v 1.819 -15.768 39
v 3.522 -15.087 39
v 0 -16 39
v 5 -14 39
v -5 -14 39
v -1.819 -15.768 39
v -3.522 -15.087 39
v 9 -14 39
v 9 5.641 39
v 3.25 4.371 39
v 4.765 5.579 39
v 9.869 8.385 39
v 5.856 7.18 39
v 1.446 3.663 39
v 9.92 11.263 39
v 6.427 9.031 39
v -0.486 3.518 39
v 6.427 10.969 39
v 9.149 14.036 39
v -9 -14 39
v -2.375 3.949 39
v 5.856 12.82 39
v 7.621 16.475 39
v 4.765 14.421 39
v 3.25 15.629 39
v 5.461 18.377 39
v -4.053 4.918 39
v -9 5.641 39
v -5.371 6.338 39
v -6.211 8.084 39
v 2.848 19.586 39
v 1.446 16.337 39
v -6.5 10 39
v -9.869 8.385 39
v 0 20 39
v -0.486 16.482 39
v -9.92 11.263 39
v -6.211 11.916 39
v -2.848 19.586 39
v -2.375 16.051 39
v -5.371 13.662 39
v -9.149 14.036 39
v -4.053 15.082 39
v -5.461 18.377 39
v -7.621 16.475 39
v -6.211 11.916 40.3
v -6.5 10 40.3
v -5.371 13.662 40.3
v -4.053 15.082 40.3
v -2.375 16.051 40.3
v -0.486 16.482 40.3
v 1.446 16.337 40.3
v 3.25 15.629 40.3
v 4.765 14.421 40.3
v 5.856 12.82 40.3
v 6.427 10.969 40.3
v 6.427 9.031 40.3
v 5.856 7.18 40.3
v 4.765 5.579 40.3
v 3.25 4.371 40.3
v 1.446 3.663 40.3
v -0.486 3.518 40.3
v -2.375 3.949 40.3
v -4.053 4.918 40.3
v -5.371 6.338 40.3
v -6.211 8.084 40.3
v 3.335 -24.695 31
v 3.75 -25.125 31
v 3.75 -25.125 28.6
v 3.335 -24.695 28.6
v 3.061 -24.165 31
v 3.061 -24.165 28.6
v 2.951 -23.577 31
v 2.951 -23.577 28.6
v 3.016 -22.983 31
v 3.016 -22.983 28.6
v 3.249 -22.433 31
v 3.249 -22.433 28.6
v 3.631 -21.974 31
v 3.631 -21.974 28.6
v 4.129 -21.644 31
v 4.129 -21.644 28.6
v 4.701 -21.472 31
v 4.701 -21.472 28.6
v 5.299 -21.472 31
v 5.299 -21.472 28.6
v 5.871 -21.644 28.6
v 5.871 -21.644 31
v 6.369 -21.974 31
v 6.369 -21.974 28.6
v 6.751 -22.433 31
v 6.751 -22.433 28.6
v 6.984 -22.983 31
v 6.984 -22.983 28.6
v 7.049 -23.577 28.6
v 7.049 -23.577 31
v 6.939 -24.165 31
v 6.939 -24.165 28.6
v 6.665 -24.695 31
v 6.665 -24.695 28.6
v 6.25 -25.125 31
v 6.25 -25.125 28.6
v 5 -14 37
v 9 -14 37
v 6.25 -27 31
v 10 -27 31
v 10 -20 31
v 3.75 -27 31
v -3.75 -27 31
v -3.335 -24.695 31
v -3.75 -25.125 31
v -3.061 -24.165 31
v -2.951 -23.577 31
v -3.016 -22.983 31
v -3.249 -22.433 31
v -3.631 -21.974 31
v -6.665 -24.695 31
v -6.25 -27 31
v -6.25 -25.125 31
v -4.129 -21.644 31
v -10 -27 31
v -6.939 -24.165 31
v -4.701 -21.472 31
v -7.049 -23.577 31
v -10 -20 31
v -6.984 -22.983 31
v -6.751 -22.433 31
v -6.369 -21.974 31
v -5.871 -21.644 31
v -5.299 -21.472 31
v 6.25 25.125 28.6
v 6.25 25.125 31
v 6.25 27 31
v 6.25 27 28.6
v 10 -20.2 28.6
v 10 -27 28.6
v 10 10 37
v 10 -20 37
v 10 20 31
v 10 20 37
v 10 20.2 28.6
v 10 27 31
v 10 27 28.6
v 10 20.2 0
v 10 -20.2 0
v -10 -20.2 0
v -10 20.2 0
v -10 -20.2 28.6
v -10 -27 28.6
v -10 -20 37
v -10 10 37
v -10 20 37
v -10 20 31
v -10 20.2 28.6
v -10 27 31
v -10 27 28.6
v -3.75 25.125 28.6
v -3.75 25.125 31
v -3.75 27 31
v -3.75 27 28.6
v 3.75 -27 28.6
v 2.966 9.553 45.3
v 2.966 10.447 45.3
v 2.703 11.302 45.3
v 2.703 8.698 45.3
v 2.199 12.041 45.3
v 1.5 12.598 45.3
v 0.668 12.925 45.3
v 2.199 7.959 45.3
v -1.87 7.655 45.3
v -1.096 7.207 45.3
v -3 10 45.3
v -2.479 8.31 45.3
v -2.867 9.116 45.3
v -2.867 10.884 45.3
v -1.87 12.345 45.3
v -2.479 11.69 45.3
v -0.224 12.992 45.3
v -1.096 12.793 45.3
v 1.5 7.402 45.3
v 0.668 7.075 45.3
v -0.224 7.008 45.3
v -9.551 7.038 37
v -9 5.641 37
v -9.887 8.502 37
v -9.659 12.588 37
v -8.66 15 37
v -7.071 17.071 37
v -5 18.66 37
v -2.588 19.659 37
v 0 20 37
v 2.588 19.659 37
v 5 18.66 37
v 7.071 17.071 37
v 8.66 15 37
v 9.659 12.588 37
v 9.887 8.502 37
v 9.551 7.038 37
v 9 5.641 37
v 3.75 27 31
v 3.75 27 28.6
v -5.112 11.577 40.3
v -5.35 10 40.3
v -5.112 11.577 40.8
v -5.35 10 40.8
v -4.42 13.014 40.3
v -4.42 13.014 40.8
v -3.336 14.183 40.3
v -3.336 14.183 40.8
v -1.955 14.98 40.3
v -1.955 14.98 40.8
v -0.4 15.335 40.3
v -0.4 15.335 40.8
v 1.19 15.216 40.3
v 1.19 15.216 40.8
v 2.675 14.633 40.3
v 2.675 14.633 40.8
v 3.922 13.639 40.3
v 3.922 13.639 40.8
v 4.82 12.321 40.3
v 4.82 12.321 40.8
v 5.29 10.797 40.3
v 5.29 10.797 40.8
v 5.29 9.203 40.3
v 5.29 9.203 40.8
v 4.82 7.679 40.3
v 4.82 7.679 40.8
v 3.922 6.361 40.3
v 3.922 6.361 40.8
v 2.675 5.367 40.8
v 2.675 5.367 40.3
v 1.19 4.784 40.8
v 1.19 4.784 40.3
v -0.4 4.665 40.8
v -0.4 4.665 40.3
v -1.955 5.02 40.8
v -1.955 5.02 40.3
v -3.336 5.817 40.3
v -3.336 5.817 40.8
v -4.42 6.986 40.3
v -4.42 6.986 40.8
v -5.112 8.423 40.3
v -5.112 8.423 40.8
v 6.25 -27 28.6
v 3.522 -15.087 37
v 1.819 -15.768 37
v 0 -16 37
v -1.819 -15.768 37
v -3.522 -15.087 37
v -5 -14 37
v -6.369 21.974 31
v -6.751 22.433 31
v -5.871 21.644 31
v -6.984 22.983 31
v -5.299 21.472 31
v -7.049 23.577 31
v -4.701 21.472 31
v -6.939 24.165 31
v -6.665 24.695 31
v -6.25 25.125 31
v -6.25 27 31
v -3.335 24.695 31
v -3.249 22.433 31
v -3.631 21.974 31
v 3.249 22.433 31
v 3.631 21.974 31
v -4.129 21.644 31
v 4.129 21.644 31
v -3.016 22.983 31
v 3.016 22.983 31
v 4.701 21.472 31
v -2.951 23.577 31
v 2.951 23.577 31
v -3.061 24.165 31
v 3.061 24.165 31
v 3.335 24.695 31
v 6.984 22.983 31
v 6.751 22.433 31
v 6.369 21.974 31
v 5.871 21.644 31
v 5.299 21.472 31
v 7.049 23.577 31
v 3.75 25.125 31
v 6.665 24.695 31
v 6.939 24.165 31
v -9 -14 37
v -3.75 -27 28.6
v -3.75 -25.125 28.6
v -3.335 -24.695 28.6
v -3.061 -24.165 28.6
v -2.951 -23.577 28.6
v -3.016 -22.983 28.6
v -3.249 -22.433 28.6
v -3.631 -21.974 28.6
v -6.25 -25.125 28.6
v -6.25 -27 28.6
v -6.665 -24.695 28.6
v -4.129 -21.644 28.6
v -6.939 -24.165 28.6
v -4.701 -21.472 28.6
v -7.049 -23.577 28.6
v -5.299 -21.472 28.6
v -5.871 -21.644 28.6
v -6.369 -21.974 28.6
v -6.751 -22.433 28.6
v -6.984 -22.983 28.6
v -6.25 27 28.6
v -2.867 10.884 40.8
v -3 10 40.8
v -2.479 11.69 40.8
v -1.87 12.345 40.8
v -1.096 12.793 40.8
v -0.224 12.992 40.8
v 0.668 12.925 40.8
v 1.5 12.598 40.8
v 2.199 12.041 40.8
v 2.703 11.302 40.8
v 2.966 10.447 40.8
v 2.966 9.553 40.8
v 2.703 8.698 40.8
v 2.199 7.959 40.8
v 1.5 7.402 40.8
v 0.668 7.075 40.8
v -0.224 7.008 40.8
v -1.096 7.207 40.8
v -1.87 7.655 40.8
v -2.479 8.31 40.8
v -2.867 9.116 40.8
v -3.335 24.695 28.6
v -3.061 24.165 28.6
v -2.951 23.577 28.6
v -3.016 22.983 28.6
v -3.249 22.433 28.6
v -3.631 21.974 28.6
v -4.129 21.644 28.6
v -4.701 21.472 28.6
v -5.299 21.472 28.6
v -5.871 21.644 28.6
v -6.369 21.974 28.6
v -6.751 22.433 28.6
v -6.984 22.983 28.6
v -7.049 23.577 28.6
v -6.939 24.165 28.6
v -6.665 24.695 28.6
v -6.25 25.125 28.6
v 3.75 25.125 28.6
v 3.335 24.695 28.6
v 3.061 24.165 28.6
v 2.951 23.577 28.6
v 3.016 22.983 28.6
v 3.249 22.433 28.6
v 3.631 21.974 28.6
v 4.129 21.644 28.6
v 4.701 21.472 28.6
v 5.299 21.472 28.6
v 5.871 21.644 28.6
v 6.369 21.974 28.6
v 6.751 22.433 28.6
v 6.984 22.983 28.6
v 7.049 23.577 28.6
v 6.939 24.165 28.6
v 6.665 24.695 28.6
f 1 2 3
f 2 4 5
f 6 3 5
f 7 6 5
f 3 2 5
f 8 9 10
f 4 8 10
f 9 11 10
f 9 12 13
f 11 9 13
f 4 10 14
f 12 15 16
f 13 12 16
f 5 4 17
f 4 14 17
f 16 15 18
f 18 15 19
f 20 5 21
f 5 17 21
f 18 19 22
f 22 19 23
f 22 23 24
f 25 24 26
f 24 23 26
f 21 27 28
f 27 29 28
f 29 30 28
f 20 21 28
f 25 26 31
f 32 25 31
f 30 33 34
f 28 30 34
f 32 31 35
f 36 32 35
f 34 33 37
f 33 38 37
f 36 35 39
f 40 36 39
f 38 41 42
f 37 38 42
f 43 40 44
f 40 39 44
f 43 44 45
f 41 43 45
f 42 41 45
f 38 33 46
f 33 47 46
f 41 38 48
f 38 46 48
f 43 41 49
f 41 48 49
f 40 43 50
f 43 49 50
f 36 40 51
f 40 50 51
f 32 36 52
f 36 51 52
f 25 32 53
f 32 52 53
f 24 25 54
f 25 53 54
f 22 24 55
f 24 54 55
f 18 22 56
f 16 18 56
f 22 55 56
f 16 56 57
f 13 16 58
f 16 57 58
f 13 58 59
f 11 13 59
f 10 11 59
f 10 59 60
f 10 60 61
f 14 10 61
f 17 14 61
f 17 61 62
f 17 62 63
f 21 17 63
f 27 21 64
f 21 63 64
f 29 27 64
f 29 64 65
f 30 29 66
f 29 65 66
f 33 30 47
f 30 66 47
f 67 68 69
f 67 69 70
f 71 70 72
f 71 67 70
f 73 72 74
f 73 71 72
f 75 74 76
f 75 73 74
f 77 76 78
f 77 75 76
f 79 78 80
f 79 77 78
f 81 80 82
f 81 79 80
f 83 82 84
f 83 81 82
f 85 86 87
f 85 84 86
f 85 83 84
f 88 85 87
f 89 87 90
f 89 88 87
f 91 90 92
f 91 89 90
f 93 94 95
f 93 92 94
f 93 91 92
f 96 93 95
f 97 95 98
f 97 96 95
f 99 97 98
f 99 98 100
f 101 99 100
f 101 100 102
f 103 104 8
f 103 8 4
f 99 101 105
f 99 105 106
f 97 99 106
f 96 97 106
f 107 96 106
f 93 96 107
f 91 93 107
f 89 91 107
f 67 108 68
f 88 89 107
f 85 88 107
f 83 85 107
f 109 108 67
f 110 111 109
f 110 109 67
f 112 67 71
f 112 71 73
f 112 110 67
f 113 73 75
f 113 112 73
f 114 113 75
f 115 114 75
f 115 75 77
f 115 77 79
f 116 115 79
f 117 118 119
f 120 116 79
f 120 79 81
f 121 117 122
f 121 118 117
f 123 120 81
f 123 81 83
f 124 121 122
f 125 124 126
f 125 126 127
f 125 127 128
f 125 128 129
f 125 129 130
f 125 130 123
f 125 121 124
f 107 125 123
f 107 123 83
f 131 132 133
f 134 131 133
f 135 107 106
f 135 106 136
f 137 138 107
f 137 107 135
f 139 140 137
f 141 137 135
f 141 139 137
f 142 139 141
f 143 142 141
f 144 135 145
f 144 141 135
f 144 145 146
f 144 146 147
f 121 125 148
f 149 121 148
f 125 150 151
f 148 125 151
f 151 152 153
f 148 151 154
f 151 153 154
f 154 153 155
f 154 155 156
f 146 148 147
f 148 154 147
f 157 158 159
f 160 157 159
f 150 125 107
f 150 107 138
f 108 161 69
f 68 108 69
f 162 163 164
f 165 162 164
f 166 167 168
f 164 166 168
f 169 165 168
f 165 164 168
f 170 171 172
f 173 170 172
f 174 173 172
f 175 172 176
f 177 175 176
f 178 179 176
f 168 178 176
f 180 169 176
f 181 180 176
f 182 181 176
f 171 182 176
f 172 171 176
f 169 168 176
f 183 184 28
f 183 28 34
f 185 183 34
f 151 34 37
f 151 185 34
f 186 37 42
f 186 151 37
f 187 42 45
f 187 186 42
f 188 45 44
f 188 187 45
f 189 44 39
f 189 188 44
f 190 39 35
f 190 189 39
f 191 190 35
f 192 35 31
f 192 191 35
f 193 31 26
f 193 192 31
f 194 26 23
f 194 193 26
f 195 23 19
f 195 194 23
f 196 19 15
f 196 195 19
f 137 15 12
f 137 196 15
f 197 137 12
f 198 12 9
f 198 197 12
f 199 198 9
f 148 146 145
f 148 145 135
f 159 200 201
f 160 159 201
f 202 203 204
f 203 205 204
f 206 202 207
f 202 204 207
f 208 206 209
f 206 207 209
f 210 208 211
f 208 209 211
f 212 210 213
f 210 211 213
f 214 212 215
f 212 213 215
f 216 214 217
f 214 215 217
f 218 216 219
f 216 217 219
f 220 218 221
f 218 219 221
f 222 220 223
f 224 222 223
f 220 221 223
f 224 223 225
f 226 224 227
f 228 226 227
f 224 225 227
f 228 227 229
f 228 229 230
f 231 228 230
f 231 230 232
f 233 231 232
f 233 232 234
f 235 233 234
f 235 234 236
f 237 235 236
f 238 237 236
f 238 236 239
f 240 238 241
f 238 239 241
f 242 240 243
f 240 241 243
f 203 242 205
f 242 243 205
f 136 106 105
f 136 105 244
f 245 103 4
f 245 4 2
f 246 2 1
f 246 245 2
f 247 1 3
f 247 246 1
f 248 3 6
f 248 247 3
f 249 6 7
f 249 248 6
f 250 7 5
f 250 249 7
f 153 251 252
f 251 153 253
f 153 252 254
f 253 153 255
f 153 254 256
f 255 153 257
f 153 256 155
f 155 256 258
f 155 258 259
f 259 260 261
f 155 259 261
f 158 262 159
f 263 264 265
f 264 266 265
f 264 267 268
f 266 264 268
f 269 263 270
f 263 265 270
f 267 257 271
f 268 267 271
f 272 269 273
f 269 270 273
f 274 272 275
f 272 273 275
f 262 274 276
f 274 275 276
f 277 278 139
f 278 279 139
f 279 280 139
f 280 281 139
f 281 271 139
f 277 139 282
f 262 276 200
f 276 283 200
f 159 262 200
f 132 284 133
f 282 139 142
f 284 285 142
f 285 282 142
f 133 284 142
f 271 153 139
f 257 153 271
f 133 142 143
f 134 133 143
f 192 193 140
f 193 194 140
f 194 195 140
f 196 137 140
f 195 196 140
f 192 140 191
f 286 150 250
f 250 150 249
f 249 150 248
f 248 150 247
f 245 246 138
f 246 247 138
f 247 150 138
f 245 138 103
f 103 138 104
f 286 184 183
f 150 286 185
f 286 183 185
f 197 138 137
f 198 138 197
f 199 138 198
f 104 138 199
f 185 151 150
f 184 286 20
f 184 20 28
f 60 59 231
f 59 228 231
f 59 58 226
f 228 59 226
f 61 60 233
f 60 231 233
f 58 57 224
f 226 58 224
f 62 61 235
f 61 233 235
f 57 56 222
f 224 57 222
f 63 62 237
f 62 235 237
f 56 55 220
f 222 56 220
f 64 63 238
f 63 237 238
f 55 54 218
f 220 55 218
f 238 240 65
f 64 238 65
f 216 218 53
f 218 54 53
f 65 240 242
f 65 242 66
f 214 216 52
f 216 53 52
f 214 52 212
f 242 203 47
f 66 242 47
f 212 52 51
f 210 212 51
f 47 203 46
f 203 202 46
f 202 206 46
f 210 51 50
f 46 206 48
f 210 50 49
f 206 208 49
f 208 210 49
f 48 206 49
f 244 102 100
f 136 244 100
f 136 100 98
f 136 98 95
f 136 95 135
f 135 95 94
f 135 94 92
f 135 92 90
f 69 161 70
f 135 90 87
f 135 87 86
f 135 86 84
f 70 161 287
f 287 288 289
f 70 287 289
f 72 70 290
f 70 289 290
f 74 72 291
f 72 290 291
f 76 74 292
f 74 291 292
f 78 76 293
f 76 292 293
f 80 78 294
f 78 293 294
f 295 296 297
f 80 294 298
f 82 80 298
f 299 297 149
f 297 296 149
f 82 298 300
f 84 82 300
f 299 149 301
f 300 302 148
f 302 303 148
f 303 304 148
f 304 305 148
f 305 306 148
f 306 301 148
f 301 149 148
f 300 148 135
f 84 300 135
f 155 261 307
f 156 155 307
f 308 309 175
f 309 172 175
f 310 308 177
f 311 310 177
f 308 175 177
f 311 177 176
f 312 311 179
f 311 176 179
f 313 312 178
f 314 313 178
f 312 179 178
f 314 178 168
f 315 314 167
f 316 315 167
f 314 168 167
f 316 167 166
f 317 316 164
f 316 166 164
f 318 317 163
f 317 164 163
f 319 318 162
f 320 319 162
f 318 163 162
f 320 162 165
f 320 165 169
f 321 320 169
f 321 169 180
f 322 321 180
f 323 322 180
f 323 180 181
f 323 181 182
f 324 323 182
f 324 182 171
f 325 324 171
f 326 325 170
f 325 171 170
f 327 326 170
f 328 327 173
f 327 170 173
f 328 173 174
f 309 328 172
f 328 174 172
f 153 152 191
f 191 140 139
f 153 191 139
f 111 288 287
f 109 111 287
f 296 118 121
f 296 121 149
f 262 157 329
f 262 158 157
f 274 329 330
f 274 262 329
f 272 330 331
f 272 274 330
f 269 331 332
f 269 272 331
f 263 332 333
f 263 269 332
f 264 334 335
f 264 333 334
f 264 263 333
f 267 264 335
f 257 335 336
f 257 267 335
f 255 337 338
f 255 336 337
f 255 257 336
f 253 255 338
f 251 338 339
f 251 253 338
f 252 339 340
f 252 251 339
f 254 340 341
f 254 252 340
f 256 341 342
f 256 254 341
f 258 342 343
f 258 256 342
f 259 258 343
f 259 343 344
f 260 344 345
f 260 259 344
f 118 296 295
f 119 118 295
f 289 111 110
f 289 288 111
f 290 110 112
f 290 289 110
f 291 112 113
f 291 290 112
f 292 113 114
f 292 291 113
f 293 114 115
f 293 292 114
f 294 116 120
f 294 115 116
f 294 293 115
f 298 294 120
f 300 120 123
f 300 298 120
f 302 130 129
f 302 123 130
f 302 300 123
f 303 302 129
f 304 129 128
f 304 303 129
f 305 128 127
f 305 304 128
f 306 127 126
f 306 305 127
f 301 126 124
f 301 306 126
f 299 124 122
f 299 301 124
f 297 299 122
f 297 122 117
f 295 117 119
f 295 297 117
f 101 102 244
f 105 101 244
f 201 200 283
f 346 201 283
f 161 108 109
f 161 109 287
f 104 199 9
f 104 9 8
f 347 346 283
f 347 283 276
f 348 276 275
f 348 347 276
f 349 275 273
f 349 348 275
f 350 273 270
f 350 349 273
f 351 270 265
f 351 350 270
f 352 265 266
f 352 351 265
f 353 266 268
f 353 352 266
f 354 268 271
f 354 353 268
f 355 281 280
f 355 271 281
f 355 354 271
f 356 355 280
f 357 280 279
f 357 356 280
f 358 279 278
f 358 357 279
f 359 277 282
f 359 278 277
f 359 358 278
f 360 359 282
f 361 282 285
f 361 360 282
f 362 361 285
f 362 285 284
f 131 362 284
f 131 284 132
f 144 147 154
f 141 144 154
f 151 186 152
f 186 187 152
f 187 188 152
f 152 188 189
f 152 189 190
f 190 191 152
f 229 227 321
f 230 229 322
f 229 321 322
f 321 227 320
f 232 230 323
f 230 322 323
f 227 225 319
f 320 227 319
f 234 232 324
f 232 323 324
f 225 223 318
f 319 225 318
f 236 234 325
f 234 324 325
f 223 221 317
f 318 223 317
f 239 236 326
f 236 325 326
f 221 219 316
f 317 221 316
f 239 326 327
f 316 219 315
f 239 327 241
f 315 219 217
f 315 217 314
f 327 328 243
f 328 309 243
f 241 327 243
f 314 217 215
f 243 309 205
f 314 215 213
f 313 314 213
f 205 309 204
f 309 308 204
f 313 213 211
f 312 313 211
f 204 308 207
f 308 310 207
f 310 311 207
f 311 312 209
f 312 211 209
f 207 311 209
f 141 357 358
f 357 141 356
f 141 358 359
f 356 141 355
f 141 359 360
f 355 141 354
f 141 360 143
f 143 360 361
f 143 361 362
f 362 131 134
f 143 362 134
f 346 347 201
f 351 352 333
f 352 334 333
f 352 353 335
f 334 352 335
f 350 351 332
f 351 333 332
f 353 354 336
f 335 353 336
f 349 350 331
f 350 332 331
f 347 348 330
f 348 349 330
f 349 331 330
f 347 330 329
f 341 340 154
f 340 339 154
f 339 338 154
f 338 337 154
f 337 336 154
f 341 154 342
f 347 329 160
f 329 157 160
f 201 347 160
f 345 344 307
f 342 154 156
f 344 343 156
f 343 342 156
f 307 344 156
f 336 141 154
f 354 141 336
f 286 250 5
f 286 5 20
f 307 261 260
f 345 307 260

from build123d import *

# Parameters (mm, degrees)
ESQUISSE1_W             = 37
ESQUISSE1_H             = 54
BOSS_EXTRU_1_DEPTH      = 20
BOSS_EXTRU_2_DEPTH      = 2
ESQUISSE3_W             = 6
ESQUISSE3_H             = 7
ENL_V_MAT_EXTRU_1_DEPTH = 52.478150705
ESQUISSE4_W             = 6
ESQUISSE4_H             = 7
ENL_V_MAT_EXTRU_2_DEPTH = 52.478150705
BOSS_EXTRU_3_DEPTH      = 2
ESQUISSE6_W             = 28.6
ESQUISSE6_H             = 6.8
ENL_V_MAT_EXTRU_3_DEPTH = 52.478150705
ENL_V_MAT_EXTRU_4_DEPTH = 41.582754958
ENL_V_MAT_EXTRU_5_DEPTH = 41.582754958
ESQUISSE9_W             = 28.6
ESQUISSE9_H             = 6.8
ENL_V_MAT_EXTRU_6_DEPTH = 52.478150705
ENL_V_MAT_EXTRU_7_DEPTH = 43.308391603
ENL_V_MAT_EXTRU_8_DEPTH = 43.308391603
ESQUISSE12_W            = 2.05
ESQUISSE12_H            = 2.4
ESQUISSE13_W            = 2.05
ESQUISSE13_H            = 2.4
ESQUISSE14_W            = 2.05
ESQUISSE14_H            = 2.4
ESQUISSE15_W            = 2.05
ESQUISSE15_H            = 2.4


with BuildPart() as part:
    # Esquisse1 → Boss.-Extru.1 (new body)
    with BuildSketch(Plane(origin=(10, 0, 0), x_dir=(0, 0, -1), z_dir=(1, 0, 0))):
        with Locations((-18.5, 0)):
            Rectangle(ESQUISSE1_W, ESQUISSE1_H)
    extrude(amount=-BOSS_EXTRU_1_DEPTH)

    # Esquisse2 → Boss.-Extru.2 (add)
    with BuildSketch(Plane.XY.offset(37)):
        with BuildLine():
            Line((-9, -14), (-9, 5.641101056))
            ThreePointArc((-9, 5.641101056), (0, 20), (9, 5.641101056))
            Line((9, 5.641101056), (9, -14))
            Line((9, -14), (-9, -14))
        make_face()
    extrude(amount=BOSS_EXTRU_2_DEPTH)

    # Esquisse3 → Enlèv. mat.-Extru.1 (cut, through all)
    with BuildSketch(Plane(origin=(10, 0, 0), x_dir=(0, 0, -1), z_dir=(1, 0, 0))):
        with Locations((-34, 23.5)):
            Rectangle(ESQUISSE3_W, ESQUISSE3_H)
    extrude(amount=-ENL_V_MAT_EXTRU_1_DEPTH, mode=Mode.SUBTRACT)

    # Esquisse4 → Enlèv. mat.-Extru.2 (cut, through all)
    with BuildSketch(Plane.ZY.offset(10)):
        with Locations((34, -23.5)):
            Rectangle(ESQUISSE4_W, ESQUISSE4_H)
    extrude(amount=-ENL_V_MAT_EXTRU_2_DEPTH, mode=Mode.SUBTRACT)

    # Esquisse5 → Boss.-Extru.3 (add)
    with BuildSketch(Plane.XY.offset(37)):
        with BuildLine():
            Line((-5, -14), (5, -14))
            ThreePointArc((5, -14), (0, -16), (-5, -14))
        make_face()
    extrude(amount=BOSS_EXTRU_3_DEPTH)

    # Esquisse6 → Enlèv. mat.-Extru.3 (cut, through all)
    with BuildSketch(Plane.ZY.offset(10)):
        with Locations((14.3, -23.6)):
            Rectangle(ESQUISSE6_W, ESQUISSE6_H)
    extrude(amount=-ENL_V_MAT_EXTRU_3_DEPTH, mode=Mode.SUBTRACT)

    # Esquisse7 → Enlèv. mat.-Extru.4 (cut, through all)
    with BuildSketch(Plane(origin=(0, 0, 28.6), x_dir=(-1, 0, 0), z_dir=(0, 0, -1))):
        with BuildLine():
            Line((3.75, -27), (6.25, -27))
            Line((6.25, -27), (6.25, -25.124807681))
            ThreePointArc((6.25, -25.124807681), (5, -25.55), (3.75, -25.124807681))
            Line((3.75, -25.124807681), (3.75, -27))
        make_face()
    extrude(amount=-ENL_V_MAT_EXTRU_4_DEPTH, mode=Mode.SUBTRACT)

    # Esquisse8 → Enlèv. mat.-Extru.5 (cut, through all)
    with BuildSketch(Plane(origin=(0, 0, 28.6), x_dir=(-1, 0, 0), z_dir=(0, 0, -1))):
        with BuildLine():
            Line((-6.25, -27), (-3.75, -27))
            Line((-3.75, -27), (-3.75, -25.124807681))
            ThreePointArc((-3.75, -25.124807681), (-5, -25.55), (-6.25, -25.124807681))
            Line((-6.25, -25.124807681), (-6.25, -27))
        make_face()
    extrude(amount=-ENL_V_MAT_EXTRU_5_DEPTH, mode=Mode.SUBTRACT)

    # Esquisse9 → Enlèv. mat.-Extru.6 (cut, through all)
    with BuildSketch(Plane.ZY.offset(10)):
        with Locations((14.3, 23.6)):
            Rectangle(ESQUISSE9_W, ESQUISSE9_H)
    extrude(amount=-ENL_V_MAT_EXTRU_6_DEPTH, mode=Mode.SUBTRACT)

    # Esquisse10 → Enlèv. mat.-Extru.7 (cut, through all)
    with BuildSketch(Plane.XY.offset(31)):
        with BuildLine():
            Line((-3.75, 27), (-6.25, 27))
            Line((-6.25, 27), (-6.25, 25.124807681))
            ThreePointArc((-6.25, 25.124807681), (-5, 25.55), (-3.75, 25.124807681))
            Line((-3.75, 25.124807681), (-3.75, 27))
        make_face()
    extrude(amount=-ENL_V_MAT_EXTRU_7_DEPTH, mode=Mode.SUBTRACT)

    # Esquisse11 → Enlèv. mat.-Extru.8 (cut, through all)
    with BuildSketch(Plane.XY.offset(31)):
        with BuildLine():
            Line((6.25, 27), (3.75, 27))
            Line((3.75, 27), (3.75, 25.124807681))
            ThreePointArc((3.75, 25.124807681), (5, 25.55), (6.25, 25.124807681))
            Line((6.25, 25.124807681), (6.25, 27))
        make_face()
    extrude(amount=-ENL_V_MAT_EXTRU_8_DEPTH, mode=Mode.SUBTRACT)

    # Esquisse12 → Enlèvement de matière-Révolution1 (revolve, cut)
    with BuildSketch(Plane(origin=(0, 23.5, 0), x_dir=(1, 0, 0), z_dir=(0, 1, 0))):
        with Locations((6.025, -29.8)):
            Rectangle(ESQUISSE12_W, ESQUISSE12_H)
    revolve(axis=Axis((5, 23.5, 28.6), (0, 0, 1)), mode=Mode.SUBTRACT)

    # Esquisse13 → Enlèvement de matière-Révolution2 (revolve, cut)
    with BuildSketch(Plane.XZ.offset(-23.5)):
        with Locations((-3.975, 29.8)):
            Rectangle(ESQUISSE13_W, ESQUISSE13_H)
    revolve(axis=Axis((-5, 23.5, 31), (0, 0, -1)), mode=Mode.SUBTRACT)

    # Esquisse14 → Enlèvement de matière-Révolution3 (revolve, cut)
    with BuildSketch(Plane(origin=(0, -23.5, 0), x_dir=(1, 0, 0), z_dir=(0, 1, 0))):
        with Locations((-3.975, -29.8)):
            Rectangle(ESQUISSE14_W, ESQUISSE14_H)
    revolve(axis=Axis((-5, -23.5, 28.6), (0, 0, 1)), mode=Mode.SUBTRACT)

    # Esquisse15 → Enlèvement de matière-Révolution4 (revolve, cut)
    with BuildSketch(Plane.XZ.offset(23.5)):
        with Locations((6.025, 29.8)):
            Rectangle(ESQUISSE15_W, ESQUISSE15_H)
    revolve(axis=Axis((5, -23.5, 31), (0, 0, -1)), mode=Mode.SUBTRACT)

    # Esquisse16 → Révolution1 (revolve)
    with BuildSketch(Plane.XZ.offset(-10), mode=Mode.PRIVATE) as r_volution1_sk:
        Polygon((3, 45.3), (0, 45.3), (0, 39), (6.5, 39), (6.5, 40.3), (5.35, 40.3), (5.35, 40.8), (3, 40.8), align=None)
    revolve(r_volution1_sk.sketch.rotate(Axis((0, 10, 45.3), (0, 0, -1)), 180), axis=Axis((0, 10, 45.3), (0, 0, -1)))


solid = part.part
